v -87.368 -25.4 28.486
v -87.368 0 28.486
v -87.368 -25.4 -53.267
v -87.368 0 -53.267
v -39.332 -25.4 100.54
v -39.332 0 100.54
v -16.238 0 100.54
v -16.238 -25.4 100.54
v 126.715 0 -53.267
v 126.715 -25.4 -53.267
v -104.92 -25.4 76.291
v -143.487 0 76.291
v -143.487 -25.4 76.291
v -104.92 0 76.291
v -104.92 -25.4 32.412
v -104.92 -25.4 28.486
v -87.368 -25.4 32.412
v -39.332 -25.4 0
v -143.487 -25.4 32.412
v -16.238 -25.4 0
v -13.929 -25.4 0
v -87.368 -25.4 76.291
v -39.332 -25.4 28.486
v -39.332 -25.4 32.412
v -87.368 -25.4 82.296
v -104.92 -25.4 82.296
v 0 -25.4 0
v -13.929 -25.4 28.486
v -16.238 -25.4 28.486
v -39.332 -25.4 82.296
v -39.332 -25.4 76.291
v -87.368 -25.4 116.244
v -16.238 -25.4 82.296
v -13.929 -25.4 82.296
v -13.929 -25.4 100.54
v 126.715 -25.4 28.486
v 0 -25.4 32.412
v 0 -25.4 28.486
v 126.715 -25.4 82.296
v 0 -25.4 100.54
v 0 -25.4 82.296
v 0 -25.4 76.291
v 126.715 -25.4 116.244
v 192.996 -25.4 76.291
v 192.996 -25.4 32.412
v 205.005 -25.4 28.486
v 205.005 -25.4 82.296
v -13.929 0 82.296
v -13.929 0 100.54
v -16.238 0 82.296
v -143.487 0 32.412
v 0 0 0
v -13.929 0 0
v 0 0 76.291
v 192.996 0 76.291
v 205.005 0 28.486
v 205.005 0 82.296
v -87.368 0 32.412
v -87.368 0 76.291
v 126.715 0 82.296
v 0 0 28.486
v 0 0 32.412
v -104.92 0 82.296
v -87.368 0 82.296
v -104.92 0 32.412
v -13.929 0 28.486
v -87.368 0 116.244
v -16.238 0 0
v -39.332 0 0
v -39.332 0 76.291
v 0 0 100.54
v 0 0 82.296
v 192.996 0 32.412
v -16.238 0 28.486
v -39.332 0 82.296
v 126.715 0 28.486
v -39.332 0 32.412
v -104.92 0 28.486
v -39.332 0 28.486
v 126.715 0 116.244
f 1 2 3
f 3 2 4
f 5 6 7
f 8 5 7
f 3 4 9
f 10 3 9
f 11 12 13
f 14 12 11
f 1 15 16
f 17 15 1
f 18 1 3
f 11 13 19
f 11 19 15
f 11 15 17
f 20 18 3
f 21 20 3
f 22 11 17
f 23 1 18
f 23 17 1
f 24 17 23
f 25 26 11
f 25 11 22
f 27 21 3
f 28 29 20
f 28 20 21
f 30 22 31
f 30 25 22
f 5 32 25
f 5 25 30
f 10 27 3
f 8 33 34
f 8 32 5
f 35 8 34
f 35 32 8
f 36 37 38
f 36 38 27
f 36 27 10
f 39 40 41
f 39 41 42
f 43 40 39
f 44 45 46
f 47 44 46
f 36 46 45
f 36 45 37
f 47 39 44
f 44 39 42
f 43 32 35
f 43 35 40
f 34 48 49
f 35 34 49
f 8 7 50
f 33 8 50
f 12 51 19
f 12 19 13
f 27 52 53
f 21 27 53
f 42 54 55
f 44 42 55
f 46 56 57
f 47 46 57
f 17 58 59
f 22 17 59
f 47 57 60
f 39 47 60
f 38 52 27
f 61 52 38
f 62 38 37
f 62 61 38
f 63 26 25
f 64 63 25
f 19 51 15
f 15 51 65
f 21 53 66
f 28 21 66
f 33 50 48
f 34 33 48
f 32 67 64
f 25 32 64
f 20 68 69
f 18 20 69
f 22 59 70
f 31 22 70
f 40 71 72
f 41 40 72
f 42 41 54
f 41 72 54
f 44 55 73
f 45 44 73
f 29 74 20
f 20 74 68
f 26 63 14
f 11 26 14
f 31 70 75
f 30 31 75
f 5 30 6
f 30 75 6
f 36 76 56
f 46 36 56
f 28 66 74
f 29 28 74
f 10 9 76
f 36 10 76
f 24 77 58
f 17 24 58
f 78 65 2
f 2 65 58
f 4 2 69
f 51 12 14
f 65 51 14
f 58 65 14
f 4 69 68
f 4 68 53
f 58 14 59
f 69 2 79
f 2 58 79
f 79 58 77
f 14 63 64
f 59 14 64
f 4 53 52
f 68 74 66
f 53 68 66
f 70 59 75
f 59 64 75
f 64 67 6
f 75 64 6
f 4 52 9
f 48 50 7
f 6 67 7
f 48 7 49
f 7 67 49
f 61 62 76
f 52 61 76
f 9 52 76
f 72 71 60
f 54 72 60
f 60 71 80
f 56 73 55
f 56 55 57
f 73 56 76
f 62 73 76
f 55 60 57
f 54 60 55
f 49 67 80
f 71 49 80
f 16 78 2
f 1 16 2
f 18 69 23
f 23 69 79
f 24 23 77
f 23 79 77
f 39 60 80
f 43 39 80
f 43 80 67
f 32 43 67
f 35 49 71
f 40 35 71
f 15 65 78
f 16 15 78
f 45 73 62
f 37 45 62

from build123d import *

# Parameters (mm, degrees)
F0_W     = 126.7150789499
F0_H     = 3.926018253
F0_H_2   = 6.0044974089
F0_W_2   = 48.0359867215
F0_W_3   = 17.5516083837
F0_H_3   = 43.8790284097
F0_W_4   = 38.5673493147
F1_DEPTH = 25.4


with BuildPart() as f1:
    # F0 (on Front) → F1 (new body)
    with BuildSketch(Plane.XZ):
        Polygon((0, 28.4861717373), (0, 0), (-13.9287291095, 0), (-13.9287291095, 28.4861717373), (-16.2381511182, 28.4861717373), (-16.2381511182, 0), (-39.3323749304, 0), (-39.3323749304, 28.4861717373), (-87.3683616519, 28.4861717373), (-87.3683616519, -53.2673746347), (126.7150789499, -53.2673746347), (126.7150789499, 28.4861717373), align=None)
        with Locations((63.357539475, 30.4491808638)):
            Rectangle(F0_W, F0_H)
        Polygon((126.7150789499, 32.4121899903), (126.7150789499, 28.4861717373), (205.0045132637, 28.4861717373), (205.0045132637, 82.2957158089), (126.7150789499, 82.2957158089), (126.7150789499, 76.2912184), (192.995518446, 76.2912184), (192.995518446, 32.4121899903), align=None)
        with Locations((63.357539475, 79.2934671044)):
            Rectangle(F0_W, F0_H_2)
        with Locations((-63.3503682911, 30.4491808638)):
            Rectangle(F0_W_2, F0_H)
        Polygon((0, 100.5401462317), (0, 82.2957158089), (126.7150789499, 82.2957158089), (126.7150789499, 116.2442192435), (-87.3683616519, 116.2442192435), (-87.3683616519, 82.2957158089), (-39.3323749304, 82.2957158089), (-39.3323749304, 100.5401462317), (-16.2381511182, 100.5401462317), (-16.2381511182, 82.2957158089), (-13.9287291095, 82.2957158089), (-13.9287291095, 100.5401462317), align=None)
        with Locations((-96.1441658437, 30.4491808638)):
            Rectangle(F0_W_3, F0_H)
        with Locations((-63.3503682911, 79.2934671044)):
            Rectangle(F0_W_2, F0_H_2)
        with Locations((-96.1441658437, 54.3517041951)):
            Rectangle(F0_W_3, F0_H_3)
        with Locations((-96.1441658437, 79.2934671044)):
            Rectangle(F0_W_3, F0_H_2)
        with Locations((-124.2036446929, 54.3517041951)):
            Rectangle(F0_W_4, F0_H_3)
    extrude(amount=F1_DEPTH)


solid = f1.part
